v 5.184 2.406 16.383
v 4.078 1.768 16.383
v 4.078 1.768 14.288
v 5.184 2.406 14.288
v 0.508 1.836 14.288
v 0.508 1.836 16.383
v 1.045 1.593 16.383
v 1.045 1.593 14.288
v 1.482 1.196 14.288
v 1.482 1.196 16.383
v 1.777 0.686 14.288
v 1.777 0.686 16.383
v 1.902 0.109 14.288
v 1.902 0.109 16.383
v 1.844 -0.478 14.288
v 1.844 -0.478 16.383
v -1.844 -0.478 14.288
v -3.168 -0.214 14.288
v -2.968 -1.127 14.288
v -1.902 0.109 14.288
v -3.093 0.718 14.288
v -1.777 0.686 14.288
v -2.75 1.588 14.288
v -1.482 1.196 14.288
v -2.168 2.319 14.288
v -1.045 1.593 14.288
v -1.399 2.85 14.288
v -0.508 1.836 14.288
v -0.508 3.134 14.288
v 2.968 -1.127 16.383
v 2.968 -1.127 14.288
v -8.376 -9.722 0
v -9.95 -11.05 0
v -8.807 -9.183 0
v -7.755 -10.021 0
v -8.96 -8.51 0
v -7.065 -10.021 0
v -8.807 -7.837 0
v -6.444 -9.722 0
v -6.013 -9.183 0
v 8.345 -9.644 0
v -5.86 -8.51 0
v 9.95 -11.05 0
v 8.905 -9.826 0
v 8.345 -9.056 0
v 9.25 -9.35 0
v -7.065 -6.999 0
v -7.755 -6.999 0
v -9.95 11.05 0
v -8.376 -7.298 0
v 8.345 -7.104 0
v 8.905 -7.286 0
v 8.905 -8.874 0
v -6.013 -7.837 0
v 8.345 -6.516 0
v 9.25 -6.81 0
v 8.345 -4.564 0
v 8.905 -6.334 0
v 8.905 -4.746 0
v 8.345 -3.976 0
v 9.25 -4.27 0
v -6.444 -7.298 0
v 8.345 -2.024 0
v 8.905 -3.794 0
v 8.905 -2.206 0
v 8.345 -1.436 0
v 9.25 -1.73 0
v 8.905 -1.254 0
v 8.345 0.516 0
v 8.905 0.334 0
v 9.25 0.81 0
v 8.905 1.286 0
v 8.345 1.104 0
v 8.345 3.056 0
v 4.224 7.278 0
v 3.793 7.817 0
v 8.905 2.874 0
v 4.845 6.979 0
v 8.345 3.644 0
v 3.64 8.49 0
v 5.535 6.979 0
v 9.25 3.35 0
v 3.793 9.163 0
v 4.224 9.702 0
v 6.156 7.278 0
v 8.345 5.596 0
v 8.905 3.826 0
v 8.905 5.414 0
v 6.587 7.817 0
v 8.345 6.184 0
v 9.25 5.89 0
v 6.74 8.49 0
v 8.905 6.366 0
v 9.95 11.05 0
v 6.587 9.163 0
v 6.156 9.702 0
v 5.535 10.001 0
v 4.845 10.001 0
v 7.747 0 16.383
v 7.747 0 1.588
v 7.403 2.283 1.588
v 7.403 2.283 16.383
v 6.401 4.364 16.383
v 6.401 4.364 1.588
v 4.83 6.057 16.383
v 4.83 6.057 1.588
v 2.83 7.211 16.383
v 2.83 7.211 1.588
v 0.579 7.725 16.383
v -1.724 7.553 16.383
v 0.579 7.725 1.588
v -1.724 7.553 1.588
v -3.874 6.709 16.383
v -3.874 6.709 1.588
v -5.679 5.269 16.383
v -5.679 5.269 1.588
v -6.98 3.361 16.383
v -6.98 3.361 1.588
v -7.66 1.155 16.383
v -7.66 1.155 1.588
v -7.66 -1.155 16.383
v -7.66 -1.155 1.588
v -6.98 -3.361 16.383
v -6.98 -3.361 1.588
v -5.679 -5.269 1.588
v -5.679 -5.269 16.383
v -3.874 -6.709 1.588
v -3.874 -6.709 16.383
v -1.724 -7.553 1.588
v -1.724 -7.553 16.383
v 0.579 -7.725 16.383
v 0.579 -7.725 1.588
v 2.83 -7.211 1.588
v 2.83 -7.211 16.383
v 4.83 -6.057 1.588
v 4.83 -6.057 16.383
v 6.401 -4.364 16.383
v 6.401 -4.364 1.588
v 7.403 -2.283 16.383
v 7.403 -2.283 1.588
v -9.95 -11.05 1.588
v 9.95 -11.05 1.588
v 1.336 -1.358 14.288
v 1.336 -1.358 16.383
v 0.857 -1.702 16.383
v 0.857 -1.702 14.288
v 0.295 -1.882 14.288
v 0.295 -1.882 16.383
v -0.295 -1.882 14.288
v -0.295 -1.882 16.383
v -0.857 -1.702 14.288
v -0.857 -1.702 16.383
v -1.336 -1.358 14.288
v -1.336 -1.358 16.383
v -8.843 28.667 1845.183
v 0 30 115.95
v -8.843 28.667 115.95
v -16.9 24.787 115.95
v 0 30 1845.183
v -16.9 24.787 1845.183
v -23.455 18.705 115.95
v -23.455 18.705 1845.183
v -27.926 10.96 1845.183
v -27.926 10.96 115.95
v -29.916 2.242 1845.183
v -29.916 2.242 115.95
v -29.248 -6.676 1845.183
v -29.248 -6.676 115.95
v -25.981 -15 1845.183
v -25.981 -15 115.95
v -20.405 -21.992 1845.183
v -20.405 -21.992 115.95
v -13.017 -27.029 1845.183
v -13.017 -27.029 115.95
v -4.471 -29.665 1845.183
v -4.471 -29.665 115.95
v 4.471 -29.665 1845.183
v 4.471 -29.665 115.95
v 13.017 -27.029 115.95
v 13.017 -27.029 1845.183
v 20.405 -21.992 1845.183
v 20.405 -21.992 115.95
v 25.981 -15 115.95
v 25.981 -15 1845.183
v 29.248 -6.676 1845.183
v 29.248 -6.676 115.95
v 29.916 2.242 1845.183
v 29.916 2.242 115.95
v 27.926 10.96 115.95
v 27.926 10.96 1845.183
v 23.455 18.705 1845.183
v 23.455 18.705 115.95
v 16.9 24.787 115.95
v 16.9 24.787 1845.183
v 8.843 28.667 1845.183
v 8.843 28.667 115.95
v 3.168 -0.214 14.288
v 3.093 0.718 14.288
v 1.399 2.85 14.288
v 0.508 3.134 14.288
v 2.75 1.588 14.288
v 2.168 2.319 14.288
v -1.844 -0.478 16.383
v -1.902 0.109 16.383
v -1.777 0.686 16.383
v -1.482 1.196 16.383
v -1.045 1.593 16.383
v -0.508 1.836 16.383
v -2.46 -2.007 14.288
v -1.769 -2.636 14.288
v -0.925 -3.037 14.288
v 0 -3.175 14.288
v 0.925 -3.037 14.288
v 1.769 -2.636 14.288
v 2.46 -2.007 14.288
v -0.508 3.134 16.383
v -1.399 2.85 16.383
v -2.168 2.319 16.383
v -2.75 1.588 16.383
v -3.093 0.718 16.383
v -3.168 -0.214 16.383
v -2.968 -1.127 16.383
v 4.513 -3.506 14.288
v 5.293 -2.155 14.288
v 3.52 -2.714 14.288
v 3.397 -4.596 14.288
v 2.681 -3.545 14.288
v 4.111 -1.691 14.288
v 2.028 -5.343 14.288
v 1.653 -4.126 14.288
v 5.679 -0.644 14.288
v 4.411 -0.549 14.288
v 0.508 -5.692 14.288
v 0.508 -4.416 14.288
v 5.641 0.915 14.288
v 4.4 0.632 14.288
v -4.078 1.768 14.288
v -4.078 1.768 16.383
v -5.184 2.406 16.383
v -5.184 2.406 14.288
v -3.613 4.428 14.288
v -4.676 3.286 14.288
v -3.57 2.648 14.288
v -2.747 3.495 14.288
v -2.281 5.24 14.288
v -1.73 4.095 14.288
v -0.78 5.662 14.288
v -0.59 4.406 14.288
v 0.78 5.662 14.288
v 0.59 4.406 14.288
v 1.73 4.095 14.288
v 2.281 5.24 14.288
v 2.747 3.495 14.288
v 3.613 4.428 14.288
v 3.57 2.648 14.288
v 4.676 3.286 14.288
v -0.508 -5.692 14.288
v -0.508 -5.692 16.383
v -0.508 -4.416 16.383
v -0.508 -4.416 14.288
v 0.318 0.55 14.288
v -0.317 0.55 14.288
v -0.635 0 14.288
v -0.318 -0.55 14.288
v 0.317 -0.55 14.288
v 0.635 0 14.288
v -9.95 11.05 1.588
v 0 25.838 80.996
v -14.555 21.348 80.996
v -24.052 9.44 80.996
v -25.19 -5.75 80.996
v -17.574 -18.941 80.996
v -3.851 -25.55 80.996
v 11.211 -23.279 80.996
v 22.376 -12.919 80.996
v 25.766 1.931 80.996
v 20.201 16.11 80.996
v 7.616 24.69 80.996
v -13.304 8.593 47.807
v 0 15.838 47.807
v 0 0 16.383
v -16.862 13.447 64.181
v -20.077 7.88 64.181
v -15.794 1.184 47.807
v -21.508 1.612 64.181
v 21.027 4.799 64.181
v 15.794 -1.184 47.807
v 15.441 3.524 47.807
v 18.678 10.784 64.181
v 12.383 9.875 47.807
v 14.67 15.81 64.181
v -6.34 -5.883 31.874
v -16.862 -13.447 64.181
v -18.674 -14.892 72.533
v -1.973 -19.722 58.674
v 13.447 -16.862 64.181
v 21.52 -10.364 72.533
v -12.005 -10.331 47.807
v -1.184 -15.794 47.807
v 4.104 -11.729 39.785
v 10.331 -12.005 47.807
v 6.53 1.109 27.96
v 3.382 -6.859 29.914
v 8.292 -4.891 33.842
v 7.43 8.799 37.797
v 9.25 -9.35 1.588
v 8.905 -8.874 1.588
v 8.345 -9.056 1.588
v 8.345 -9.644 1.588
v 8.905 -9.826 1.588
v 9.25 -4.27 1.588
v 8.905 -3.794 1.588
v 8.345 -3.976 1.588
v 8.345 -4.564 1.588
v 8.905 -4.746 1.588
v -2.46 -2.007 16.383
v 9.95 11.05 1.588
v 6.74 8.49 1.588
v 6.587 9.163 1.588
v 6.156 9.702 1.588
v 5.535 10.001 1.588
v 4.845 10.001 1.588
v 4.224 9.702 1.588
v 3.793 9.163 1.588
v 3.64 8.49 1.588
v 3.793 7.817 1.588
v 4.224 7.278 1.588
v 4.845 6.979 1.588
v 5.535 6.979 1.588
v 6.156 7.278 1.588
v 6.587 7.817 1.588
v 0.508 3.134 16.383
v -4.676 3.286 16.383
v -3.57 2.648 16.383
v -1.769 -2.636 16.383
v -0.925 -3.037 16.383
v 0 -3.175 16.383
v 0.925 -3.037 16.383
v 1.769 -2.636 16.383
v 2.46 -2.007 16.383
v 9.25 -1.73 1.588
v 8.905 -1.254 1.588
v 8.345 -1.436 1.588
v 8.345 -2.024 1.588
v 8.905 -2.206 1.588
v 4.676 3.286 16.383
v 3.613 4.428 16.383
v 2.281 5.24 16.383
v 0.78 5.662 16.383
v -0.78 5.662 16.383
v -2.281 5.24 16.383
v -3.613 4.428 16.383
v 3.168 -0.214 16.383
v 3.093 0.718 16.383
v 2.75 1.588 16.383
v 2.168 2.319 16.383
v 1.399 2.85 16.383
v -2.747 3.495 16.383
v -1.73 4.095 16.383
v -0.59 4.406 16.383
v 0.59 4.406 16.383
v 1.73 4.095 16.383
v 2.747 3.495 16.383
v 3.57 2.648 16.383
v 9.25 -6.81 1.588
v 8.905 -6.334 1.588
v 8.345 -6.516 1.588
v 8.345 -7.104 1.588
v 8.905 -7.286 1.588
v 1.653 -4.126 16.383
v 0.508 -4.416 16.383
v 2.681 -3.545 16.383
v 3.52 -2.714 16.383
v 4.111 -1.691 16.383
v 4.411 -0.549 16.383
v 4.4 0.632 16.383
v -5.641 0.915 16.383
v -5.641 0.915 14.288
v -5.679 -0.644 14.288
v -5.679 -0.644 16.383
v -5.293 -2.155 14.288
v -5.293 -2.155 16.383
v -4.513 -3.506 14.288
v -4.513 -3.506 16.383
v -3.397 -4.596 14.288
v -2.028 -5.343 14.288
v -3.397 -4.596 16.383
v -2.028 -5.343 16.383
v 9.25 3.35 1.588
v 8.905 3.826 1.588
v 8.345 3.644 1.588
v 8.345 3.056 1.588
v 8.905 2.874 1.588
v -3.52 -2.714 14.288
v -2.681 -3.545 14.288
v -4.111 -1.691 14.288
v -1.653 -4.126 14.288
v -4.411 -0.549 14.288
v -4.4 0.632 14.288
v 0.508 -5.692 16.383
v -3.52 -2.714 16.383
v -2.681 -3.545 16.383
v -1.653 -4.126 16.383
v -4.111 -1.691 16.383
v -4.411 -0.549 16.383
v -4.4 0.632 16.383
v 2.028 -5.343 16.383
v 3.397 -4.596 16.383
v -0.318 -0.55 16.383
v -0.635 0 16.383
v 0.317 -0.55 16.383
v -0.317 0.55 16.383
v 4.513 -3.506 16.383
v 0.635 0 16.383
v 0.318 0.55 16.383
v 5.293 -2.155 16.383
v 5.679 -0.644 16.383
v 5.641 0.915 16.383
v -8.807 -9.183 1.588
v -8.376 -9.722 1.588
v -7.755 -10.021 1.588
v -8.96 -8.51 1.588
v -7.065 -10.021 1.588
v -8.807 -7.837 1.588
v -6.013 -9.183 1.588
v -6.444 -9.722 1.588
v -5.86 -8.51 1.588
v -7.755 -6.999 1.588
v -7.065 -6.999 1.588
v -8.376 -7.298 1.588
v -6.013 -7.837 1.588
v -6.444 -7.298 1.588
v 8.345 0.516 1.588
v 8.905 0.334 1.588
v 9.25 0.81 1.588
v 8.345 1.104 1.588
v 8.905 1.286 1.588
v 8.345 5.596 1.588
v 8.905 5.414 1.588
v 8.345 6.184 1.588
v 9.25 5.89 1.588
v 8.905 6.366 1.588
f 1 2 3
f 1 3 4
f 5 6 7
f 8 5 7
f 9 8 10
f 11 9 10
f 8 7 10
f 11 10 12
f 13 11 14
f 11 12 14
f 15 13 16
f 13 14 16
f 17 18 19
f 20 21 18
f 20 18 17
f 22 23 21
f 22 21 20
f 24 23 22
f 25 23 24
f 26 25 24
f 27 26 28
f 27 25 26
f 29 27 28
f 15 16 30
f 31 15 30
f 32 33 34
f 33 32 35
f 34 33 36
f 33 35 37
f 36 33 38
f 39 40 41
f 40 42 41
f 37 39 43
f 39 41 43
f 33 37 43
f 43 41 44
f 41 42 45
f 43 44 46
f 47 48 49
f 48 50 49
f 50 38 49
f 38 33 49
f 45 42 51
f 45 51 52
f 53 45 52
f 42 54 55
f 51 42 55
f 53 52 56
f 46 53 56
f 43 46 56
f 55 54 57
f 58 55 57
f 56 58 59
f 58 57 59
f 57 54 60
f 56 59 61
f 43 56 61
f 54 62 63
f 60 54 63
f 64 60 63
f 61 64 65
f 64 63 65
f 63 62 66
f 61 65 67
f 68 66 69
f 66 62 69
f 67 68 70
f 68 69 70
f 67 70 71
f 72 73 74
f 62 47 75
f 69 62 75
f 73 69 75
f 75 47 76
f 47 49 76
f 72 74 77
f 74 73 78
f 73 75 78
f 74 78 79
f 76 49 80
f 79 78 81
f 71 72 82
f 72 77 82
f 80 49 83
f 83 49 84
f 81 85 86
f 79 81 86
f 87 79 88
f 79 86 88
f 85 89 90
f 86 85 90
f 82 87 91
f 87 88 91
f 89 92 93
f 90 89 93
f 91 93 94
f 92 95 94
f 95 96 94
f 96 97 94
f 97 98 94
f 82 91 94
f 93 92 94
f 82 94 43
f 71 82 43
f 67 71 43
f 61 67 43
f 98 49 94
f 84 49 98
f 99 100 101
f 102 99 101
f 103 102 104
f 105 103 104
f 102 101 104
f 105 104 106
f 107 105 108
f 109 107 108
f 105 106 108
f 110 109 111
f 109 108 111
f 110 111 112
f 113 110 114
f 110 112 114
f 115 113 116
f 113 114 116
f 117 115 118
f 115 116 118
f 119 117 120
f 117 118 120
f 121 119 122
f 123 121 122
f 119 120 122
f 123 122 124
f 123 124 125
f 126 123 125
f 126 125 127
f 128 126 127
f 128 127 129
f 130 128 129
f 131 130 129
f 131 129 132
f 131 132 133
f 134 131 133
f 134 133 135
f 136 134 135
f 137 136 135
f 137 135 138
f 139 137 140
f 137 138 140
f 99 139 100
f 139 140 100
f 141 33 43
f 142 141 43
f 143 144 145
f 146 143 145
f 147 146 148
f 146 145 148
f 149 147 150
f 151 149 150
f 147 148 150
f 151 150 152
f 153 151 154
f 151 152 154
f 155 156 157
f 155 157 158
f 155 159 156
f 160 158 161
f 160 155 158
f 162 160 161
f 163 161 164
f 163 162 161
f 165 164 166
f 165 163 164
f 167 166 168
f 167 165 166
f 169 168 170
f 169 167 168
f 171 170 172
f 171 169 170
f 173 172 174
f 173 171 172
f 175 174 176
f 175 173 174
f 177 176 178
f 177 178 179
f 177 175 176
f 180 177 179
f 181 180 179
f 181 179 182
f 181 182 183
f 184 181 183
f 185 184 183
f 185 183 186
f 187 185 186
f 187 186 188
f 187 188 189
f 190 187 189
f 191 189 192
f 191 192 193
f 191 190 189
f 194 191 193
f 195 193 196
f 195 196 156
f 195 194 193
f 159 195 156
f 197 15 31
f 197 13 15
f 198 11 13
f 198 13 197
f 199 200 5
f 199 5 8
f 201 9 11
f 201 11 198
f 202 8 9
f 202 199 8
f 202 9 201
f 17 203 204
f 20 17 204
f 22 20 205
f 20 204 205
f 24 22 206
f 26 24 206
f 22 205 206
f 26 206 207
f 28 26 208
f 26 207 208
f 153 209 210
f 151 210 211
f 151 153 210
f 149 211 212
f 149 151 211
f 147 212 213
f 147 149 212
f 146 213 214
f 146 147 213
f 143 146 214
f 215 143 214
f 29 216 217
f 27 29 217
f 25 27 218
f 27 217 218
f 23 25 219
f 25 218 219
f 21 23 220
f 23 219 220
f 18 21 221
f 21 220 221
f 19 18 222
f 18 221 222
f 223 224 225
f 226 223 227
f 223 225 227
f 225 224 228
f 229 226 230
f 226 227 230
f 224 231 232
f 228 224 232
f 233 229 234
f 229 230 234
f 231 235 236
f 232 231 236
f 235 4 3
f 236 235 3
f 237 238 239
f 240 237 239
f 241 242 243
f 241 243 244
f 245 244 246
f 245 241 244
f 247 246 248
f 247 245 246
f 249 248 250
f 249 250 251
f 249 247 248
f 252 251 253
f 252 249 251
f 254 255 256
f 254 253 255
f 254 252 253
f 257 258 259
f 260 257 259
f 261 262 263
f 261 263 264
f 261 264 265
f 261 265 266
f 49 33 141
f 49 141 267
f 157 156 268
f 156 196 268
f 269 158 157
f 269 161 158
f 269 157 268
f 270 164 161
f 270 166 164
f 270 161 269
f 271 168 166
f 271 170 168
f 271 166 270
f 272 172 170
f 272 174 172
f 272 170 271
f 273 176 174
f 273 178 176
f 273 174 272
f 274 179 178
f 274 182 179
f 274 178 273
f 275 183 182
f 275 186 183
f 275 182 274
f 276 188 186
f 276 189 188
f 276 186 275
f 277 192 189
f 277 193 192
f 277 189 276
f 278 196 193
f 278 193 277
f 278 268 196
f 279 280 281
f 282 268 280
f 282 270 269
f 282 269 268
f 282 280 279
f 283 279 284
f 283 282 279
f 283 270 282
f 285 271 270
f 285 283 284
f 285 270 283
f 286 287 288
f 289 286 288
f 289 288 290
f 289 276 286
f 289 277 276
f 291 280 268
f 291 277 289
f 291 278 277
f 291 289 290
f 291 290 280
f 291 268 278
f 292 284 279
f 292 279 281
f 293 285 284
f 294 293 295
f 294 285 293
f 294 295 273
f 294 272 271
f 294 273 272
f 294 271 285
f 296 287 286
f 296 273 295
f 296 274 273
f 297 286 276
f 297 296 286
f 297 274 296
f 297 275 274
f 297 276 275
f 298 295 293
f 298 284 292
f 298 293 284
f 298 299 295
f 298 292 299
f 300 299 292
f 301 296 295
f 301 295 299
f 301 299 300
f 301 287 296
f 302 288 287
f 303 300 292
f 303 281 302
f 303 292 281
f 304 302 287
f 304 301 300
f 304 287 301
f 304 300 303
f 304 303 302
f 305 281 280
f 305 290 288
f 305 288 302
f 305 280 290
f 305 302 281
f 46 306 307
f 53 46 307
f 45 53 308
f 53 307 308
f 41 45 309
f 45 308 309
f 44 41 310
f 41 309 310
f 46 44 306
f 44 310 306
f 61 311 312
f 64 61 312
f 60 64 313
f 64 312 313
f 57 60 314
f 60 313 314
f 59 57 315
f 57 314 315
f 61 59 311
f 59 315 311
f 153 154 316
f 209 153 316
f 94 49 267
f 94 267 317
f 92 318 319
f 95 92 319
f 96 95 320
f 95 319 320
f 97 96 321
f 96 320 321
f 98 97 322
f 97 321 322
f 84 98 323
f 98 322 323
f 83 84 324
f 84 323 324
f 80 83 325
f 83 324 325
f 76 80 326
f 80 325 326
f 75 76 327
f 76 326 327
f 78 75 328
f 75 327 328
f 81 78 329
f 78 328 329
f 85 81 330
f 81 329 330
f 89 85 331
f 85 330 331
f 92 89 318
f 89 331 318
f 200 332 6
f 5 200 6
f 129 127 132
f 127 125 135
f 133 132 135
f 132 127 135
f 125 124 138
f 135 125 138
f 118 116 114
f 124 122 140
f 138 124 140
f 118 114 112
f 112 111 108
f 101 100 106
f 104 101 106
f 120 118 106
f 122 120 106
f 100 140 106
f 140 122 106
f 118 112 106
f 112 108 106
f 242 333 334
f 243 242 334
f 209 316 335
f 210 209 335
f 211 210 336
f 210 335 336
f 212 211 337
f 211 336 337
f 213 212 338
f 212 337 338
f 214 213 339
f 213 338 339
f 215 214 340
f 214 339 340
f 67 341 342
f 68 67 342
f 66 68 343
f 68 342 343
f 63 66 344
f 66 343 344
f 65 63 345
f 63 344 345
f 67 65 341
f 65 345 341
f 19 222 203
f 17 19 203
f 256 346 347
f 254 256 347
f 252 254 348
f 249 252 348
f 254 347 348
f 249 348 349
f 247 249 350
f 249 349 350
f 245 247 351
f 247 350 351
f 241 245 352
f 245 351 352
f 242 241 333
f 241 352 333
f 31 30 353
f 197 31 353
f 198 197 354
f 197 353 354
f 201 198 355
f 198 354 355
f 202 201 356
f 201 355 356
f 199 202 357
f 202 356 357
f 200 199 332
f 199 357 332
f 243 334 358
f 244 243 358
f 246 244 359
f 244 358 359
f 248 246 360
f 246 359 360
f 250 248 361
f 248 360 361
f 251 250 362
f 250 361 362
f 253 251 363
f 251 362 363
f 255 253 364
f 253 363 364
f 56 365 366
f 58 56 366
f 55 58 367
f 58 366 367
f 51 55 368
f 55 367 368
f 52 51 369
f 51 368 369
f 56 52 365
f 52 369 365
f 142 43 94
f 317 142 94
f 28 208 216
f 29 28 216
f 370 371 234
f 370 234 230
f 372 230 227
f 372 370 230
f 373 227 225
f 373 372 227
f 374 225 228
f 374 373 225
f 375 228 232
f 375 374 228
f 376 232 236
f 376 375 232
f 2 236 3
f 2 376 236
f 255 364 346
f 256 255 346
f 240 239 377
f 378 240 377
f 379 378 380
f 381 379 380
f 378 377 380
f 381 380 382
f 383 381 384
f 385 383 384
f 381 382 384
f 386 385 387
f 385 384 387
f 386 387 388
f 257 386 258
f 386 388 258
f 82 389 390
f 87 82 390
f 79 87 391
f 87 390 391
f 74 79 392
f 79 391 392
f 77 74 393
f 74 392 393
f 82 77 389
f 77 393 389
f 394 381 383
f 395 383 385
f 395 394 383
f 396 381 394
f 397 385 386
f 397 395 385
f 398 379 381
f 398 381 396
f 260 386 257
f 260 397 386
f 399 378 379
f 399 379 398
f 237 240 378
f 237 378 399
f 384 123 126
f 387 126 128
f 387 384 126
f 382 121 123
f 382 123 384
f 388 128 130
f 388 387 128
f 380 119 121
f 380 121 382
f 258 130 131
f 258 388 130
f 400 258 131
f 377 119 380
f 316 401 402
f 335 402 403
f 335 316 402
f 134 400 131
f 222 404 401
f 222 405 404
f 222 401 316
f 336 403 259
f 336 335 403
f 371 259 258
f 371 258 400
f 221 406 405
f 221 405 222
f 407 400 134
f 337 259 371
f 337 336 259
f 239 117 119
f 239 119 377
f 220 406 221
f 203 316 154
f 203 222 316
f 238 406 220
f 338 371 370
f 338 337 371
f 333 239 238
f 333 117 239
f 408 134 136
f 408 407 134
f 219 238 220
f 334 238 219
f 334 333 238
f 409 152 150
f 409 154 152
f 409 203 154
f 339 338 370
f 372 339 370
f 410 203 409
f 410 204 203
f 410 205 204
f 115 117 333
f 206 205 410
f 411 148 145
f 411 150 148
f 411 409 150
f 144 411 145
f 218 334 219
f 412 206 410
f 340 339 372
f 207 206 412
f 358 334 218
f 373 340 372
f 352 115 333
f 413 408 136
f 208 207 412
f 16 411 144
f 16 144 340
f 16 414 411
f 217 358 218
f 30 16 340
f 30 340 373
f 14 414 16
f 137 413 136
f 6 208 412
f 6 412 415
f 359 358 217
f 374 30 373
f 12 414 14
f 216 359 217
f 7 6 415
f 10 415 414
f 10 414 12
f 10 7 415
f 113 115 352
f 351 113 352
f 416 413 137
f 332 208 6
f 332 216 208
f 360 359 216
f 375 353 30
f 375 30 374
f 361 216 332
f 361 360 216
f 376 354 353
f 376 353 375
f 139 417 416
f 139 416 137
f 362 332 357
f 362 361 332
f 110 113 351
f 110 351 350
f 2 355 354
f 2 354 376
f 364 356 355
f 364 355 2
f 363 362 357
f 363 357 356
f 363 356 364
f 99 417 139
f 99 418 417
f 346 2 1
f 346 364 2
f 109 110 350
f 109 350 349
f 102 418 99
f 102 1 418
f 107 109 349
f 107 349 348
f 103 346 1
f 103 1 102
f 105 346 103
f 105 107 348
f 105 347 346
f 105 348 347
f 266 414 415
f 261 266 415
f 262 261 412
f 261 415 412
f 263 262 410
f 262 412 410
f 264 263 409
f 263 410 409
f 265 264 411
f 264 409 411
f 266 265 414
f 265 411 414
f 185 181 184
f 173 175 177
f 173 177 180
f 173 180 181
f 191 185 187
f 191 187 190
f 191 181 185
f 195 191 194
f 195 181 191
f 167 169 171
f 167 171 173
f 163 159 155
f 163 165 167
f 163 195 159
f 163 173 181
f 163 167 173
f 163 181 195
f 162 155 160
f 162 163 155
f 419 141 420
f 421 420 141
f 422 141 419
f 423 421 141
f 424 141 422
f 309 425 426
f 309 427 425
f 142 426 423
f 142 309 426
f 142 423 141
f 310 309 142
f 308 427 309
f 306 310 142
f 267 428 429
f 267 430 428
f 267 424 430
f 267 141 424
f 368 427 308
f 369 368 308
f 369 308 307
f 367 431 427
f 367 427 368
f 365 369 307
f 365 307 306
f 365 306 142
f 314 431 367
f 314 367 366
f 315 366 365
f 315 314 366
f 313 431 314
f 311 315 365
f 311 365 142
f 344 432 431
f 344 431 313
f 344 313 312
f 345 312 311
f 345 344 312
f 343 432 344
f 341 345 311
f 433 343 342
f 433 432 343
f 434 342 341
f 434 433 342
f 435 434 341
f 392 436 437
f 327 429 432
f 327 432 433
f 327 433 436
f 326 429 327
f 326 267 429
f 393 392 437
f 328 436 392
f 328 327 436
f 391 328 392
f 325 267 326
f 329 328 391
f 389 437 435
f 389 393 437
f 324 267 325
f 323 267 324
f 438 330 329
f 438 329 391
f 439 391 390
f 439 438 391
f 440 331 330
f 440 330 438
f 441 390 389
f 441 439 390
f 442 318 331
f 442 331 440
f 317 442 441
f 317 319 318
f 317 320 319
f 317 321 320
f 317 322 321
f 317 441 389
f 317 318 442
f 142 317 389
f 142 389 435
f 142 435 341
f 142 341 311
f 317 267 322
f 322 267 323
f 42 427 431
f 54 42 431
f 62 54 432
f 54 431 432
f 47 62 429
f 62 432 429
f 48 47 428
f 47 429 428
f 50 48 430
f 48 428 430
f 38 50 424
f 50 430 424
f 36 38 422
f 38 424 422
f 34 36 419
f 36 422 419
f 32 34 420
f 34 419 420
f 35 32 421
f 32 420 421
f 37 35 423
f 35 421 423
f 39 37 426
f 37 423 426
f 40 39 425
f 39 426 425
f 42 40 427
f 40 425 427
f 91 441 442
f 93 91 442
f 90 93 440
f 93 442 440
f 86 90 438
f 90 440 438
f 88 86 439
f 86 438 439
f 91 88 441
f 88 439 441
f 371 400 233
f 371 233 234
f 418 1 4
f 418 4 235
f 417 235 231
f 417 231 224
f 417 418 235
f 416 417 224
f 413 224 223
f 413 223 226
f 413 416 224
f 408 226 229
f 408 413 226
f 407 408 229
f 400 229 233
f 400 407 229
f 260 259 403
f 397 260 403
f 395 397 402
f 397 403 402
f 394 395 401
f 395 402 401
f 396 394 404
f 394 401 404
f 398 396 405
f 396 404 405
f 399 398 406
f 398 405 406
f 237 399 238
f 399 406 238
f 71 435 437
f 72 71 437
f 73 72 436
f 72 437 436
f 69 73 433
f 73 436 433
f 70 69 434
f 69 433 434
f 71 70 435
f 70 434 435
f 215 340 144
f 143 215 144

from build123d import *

# Parameters (mm, degrees)
SKETCH1_W          = 19.9
SKETCH1_H          = 22.1
EXTRUDE1_DEPTH     = 1.5875
SKETCH2_R          = 7.747
EXTRUDE2_DEPTH     = 14.7955
SKETCH3_R          = 0.635
EXTRUDE3_DEPTH     = 2.0955
SKETCH5_R          = 1.55
CUT_EXTRUDE1_DEPTH = 2.5875
SKETCH6_R          = 0.5
CUT_EXTRUDE2_DEPTH = 2.5875


with BuildPart() as part:
    # Sketch1 → Extrude1 (new body)
    with BuildSketch(Plane.XY):
        Rectangle(SKETCH1_W, SKETCH1_H)
    extrude(amount=EXTRUDE1_DEPTH)

    # Sketch5 → Cut-Extrude1 (cut, through all)
    with BuildSketch(Plane.XY.offset(1.5875)):
        with Locations((5.19, 8.49)):
            Circle(SKETCH5_R)
        with Locations((-7.41, -8.51)):
            Circle(SKETCH5_R)
    extrude(amount=-CUT_EXTRUDE1_DEPTH, mode=Mode.SUBTRACT)

    # Sketch6 → Cut-Extrude2 (cut, through all)
    with BuildSketch(Plane.XY.offset(1.5875)):
        with Locations((8.75, 5.89)):
            Circle(SKETCH6_R)
        with Locations((8.75, 3.35)):
            Circle(SKETCH6_R)
        with Locations((8.75, 0.81)):
            Circle(SKETCH6_R)
        with Locations((8.75, -1.73)):
            Circle(SKETCH6_R)
        with Locations((8.75, -4.27)):
            Circle(SKETCH6_R)
        with Locations((8.75, -6.81)):
            Circle(SKETCH6_R)
        with Locations((8.75, -9.35)):
            Circle(SKETCH6_R)
    extrude(amount=-CUT_EXTRUDE2_DEPTH, mode=Mode.SUBTRACT)


with BuildPart() as body_2:
    # Sketch2 → Extrude2 (new body)
    with BuildSketch(Plane.XY.offset(1.5875)):
        Circle(SKETCH2_R)
    extrude(amount=EXTRUDE2_DEPTH)

    # Sketch3 → Extrude3 (cut)
    with BuildSketch(Plane.XY.offset(16.383)):
        with BuildLine():
            Line((3.570260811, 2.647878914), (4.675743477, 3.286129629))
            ThreePointArc((4.675743477, 3.286129629), (0, 5.715), (-4.675743477, 3.286129629))
            Line((-4.675743477, 3.286129629), (-3.570260811, 2.647878914))
            ThreePointArc((-3.570260811, 2.647878914), (0, 4.445), (3.570260811, 2.647878914))
        make_face()
        with BuildLine():
            Line((-4.078260811, 1.767997104), (-5.183743477, 2.406247818))
            ThreePointArc((-5.183743477, 2.406247818), (-4.949335183, -2.8575), (-0.508, -5.692377447))
            Line((-0.508, -5.692377447), (-0.508, -4.415876017))
            ThreePointArc((-0.508, -4.415876017), (-3.84948292, -2.2225), (-4.078260811, 1.767997104))
        make_face()
        with BuildLine():
            Line((-0.508, 1.836017701), (-0.508, 3.134096521))
            ThreePointArc((-0.508, 3.134096521), (-2.749630657, 1.5875), (-2.968207205, -1.127107355))
            Line((-2.968207205, -1.127107355), (-1.844037971, -0.478067946))
            ThreePointArc((-1.844037971, -0.478067946), (-1.649778394, 0.9525), (-0.508, 1.836017701))
        make_face()
        with BuildLine():
            Line((-1.336037971, -1.357949756), (-2.460207205, -2.006989165))
            ThreePointArc((-2.460207205, -2.006989165), (0, -3.175), (2.460207205, -2.006989165))
            Line((2.460207205, -2.006989165), (1.336037971, -1.357949756))
            ThreePointArc((1.336037971, -1.357949756), (0, -1.905), (-1.336037971, -1.357949756))
        make_face()
        Circle(SKETCH3_R)
        with BuildLine():
            Line((1.844037971, -0.478067946), (2.968207205, -1.127107355))
            ThreePointArc((2.968207205, -1.127107355), (2.749630657, 1.5875), (0.508, 3.134096521))
            Line((0.508, 3.134096521), (0.508, 1.836017701))
            ThreePointArc((0.508, 1.836017701), (1.649778394, 0.9525), (1.844037971, -0.478067946))
        make_face()
        with BuildLine():
            ThreePointArc((0.508, -4.415876017), (3.84948292, -2.2225), (4.078260811, 1.767997104))
            Line((4.078260811, 1.767997104), (5.183743477, 2.406247818))
            ThreePointArc((5.183743477, 2.406247818), (4.949335183, -2.8575), (0.508, -5.692377447))
            Line((0.508, -5.692377447), (0.508, -4.415876017))
        make_face()
    extrude(amount=-EXTRUDE3_DEPTH, mode=Mode.SUBTRACT)


with BuildPart() as body_3:
    # Sketch7 → Revolve2 (revolve)
    with BuildSketch(Plane(origin=(0, 0, 0), x_dir=(0, 0, -1), z_dir=(1, 0, 0))):
        with BuildLine():
            Line((-115.950137273, 30), (-1845.183, 30))
            Line((-1845.183, 30), (-1845.183, 0))
            Line((-1845.183, 0), (-16.383, 0))
            add(Edge.make_bspline(
                [(-16.383, 0), (-62.194954023, 28.135797835), (-115.950137273, 30)],
                knots=[0, 0, 0, 1, 1, 1], degree=2))
        make_face()
    revolve(axis=Axis((0, 0, 16.383), (0, 0, 1)))


solid = Compound([part.part, body_2.part, body_3.part])
